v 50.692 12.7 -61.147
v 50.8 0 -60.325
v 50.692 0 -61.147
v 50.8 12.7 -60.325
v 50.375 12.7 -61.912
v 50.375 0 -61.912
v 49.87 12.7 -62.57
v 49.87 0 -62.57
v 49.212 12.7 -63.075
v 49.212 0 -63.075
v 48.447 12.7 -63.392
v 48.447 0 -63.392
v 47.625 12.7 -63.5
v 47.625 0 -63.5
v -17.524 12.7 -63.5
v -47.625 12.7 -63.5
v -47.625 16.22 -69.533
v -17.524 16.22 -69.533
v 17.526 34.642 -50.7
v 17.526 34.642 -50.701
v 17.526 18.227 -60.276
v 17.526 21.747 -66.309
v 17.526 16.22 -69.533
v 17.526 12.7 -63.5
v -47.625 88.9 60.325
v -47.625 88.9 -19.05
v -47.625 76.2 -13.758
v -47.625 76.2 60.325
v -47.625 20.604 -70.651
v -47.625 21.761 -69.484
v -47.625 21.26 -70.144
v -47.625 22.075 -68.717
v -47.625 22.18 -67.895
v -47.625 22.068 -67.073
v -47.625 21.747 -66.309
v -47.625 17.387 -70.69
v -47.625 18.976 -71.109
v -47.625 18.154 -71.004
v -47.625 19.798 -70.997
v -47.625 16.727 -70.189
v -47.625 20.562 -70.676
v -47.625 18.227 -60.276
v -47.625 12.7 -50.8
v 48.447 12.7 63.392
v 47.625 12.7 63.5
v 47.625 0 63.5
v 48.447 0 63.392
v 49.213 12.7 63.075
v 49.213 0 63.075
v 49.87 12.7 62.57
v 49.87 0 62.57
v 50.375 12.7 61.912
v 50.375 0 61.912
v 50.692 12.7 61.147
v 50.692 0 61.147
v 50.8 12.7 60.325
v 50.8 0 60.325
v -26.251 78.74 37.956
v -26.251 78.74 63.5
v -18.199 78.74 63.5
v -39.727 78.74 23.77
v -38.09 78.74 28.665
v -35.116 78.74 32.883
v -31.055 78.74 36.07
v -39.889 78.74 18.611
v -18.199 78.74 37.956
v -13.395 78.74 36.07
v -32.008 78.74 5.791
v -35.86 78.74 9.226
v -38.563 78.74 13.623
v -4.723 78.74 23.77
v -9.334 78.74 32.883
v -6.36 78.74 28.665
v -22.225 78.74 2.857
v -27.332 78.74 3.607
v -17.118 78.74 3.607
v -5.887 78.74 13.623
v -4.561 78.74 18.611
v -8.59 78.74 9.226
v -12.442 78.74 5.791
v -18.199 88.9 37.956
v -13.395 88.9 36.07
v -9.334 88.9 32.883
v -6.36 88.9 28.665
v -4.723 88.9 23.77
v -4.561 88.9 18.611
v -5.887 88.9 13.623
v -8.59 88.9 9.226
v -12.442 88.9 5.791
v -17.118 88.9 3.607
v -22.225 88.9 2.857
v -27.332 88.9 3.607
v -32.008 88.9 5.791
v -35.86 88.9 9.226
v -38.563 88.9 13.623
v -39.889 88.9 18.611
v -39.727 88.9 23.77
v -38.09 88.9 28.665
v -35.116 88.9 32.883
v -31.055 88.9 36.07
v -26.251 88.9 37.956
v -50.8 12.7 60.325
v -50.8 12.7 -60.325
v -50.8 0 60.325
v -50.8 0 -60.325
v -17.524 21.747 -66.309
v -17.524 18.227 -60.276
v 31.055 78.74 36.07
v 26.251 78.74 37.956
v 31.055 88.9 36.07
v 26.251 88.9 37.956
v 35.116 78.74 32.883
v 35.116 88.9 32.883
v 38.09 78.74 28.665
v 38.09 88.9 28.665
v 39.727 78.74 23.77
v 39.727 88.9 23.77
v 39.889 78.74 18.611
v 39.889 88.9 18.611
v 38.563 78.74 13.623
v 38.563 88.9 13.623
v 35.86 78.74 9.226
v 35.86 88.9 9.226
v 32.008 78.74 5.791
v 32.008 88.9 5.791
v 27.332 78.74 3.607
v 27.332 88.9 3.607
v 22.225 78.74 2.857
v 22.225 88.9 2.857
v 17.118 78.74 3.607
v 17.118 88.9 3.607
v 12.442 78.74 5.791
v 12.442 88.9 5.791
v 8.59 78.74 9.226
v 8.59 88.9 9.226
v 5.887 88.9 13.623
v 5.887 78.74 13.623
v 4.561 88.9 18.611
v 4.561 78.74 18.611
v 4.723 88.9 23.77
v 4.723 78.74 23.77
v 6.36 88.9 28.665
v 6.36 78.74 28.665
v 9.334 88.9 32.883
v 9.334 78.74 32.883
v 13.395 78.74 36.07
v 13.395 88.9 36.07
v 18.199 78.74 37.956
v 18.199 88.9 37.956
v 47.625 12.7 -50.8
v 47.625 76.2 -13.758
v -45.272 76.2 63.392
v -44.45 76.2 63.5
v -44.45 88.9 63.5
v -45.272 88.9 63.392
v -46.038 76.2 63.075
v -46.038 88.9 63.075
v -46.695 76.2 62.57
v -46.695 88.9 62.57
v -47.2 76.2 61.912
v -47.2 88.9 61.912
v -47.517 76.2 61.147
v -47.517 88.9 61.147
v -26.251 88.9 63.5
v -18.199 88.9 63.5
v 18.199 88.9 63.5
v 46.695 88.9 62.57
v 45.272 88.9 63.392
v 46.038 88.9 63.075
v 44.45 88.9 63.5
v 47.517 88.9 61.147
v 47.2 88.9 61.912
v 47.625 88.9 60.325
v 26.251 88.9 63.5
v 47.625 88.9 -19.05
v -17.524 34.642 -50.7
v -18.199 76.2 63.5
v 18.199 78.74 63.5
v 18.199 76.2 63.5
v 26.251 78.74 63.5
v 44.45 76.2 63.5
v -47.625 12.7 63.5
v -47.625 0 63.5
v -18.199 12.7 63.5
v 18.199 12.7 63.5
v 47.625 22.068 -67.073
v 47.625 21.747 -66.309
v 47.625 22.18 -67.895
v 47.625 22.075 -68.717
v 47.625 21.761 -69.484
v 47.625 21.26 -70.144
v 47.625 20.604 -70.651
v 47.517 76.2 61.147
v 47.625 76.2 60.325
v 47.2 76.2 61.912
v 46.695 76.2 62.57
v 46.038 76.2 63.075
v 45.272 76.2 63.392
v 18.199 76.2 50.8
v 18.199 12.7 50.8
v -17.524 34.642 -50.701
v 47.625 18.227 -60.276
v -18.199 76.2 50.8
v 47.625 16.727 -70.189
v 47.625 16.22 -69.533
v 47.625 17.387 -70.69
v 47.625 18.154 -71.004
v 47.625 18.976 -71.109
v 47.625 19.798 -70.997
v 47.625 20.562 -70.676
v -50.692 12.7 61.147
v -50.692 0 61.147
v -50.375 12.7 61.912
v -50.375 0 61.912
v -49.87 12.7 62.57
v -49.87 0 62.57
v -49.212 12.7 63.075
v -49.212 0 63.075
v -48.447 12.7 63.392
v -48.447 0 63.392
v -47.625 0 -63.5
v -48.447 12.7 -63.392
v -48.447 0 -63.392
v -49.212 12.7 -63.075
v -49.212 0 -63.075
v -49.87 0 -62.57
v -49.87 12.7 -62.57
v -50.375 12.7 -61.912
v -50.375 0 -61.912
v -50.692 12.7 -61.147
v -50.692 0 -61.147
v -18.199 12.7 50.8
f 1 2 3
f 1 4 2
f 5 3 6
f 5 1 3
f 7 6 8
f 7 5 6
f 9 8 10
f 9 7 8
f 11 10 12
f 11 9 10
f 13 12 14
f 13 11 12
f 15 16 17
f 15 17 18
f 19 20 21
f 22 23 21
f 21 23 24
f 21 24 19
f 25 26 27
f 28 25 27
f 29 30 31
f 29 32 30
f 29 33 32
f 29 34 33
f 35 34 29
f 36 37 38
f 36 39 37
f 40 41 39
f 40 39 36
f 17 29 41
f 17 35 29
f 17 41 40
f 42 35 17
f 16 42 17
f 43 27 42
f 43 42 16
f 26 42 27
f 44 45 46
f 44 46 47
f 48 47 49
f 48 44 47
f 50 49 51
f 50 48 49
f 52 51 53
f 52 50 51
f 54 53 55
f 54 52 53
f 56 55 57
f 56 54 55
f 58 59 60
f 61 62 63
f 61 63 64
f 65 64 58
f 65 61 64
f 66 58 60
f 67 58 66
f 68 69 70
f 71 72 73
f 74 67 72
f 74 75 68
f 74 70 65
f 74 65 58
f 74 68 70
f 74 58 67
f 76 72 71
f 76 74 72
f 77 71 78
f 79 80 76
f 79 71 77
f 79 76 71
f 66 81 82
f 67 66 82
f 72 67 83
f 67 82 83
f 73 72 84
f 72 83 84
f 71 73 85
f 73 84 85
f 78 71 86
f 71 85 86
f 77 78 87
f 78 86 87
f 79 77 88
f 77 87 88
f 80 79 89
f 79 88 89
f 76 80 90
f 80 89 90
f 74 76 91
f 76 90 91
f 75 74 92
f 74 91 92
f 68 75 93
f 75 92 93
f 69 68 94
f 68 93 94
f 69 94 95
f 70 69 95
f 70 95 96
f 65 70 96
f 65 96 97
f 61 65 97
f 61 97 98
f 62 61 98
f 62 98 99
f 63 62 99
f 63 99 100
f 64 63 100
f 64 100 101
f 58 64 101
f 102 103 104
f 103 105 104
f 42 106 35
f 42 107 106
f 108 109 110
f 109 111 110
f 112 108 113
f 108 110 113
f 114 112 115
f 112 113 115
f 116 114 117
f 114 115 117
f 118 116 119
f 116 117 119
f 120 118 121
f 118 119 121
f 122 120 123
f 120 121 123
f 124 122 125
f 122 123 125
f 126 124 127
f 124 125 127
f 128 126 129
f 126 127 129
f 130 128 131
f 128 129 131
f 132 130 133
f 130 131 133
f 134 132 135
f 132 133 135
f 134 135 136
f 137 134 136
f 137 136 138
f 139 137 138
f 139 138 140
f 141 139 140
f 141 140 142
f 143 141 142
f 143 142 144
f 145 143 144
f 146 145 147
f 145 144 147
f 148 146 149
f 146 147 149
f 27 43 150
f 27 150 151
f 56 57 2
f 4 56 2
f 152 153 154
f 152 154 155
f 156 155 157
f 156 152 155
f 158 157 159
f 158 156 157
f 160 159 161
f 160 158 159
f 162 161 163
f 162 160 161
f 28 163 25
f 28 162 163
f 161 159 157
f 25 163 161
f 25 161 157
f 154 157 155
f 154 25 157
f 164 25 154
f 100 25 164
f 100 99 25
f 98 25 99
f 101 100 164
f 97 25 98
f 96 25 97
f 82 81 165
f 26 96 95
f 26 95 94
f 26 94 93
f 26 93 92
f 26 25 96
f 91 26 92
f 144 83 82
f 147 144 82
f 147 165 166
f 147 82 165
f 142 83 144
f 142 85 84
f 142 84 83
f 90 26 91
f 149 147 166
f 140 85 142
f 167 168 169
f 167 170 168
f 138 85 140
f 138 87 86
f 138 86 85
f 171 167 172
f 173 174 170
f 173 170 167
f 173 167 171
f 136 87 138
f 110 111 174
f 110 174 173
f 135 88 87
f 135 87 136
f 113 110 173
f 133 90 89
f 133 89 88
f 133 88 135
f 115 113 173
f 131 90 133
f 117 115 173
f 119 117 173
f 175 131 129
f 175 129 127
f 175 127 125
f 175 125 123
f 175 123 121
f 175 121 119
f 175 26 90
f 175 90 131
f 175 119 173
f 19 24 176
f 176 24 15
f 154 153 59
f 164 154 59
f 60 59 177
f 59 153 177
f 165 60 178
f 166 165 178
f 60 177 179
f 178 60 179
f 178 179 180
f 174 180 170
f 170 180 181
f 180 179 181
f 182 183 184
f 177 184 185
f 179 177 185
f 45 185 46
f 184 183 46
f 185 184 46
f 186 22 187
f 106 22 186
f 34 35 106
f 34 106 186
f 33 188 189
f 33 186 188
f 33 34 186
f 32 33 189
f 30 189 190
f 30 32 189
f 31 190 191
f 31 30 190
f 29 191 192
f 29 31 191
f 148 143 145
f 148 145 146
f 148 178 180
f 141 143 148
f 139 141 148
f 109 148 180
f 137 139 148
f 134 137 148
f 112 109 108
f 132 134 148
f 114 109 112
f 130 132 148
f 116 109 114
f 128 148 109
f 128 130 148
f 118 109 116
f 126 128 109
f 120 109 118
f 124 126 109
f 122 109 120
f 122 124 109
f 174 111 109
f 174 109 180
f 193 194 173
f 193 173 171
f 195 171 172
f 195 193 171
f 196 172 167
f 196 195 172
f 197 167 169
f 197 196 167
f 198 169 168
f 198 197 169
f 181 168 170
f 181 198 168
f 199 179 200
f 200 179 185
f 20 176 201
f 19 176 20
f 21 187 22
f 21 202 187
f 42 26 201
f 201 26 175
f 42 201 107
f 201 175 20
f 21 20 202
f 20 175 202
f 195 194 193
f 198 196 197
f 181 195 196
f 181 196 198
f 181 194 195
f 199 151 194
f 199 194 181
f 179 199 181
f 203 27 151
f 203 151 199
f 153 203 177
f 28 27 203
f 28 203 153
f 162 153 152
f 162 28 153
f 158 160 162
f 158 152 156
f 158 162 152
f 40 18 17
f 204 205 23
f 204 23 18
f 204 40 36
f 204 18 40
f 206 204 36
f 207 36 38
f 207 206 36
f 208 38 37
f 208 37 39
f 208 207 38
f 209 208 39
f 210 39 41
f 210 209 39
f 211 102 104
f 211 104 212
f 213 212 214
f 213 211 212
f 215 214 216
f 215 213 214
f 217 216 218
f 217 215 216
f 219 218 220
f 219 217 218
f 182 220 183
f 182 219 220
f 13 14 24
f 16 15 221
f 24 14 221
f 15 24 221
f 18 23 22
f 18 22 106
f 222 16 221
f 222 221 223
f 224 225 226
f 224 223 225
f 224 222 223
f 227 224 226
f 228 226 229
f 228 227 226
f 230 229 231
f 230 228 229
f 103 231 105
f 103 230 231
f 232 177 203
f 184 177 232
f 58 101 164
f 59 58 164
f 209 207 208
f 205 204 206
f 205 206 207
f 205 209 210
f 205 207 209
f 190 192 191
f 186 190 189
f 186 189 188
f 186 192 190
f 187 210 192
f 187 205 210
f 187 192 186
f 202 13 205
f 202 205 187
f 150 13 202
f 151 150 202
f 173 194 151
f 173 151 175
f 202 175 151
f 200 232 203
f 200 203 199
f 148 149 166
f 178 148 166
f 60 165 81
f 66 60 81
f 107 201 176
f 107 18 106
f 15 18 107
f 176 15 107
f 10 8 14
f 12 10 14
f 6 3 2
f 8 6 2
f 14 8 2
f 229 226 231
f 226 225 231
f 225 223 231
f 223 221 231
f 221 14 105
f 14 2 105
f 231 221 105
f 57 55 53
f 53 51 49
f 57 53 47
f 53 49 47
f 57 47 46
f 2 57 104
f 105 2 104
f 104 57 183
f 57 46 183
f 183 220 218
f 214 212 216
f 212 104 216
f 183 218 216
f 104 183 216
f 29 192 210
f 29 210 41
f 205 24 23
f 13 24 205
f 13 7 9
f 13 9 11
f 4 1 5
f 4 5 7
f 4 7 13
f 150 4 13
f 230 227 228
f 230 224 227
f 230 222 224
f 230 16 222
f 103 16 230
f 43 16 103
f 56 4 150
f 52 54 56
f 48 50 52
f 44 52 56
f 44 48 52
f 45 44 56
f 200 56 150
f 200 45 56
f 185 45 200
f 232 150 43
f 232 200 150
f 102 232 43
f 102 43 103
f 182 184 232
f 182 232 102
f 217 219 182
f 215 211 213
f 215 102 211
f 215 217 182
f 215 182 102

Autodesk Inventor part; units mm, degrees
ref_plane "YZ Plane" through (0, 0, 0) normal (1, 0, 0) x (0, 1, 0)
ref_plane "XZ Plane" through (0, 0, 0) normal (0, 1, 0) x (-1, 0, 0)
ref_plane "XY Plane" through (0, 0, 0) normal (0, 0, 1) x (1, 0, 0)
sketch "Sketch1" plane through (0, 0, 0) normal (0, 1, 0) x (-1, 0, 0)
  line L0 (-50.8, -63.5) -> (50.8, -63.5)
  line L1 (50.8, -63.5) -> (50.8, 63.5)
  line L2 (50.8, 63.5) -> (-50.8, 63.5)
  line L3 (-50.8, 63.5) -> (-50.8, -63.5)
  line L4 (-50.8, -63.5) -> (50.8, 63.5) construction
  line L5 (50.8, -63.5) -> (-50.8, 63.5) construction
  point P0 (0, 0)
  dimension "d0" = 101.6
  dimension "d1" = 127
extrude "Extrusion1" add sketch "Sketch1" along normal blind 12.7
fillet "Fillet1" radius 3.175 4 edges at (-50.8, 6.35, 63.5) (50.8, 6.35, 63.5) (50.8, 6.35, -63.5) (-50.8, 6.35, -63.5)
sketch "Sketch2" plane through (0, 12.7, 0) normal (0, 1, 0) x (1, 0, 0)
  line L0 (47.625, 63.5) -> (-47.625, 63.5) projected
  line L1 (-47.625, 63.5) -> (47.625, 63.5)
  line L2 (47.625, 63.5) -> (47.625, 50.8)
  line L3 (47.625, 50.8) -> (-47.625, 50.8)
  line L4 (-47.625, 50.8) -> (-47.625, 63.5)
  line L5 (-47.625, -39.3448) -> (47.625, -39.3448)
  line L6 (47.625, -39.3448) -> (47.625, -60.325)
  line L7 (47.625, -60.325) -> (-47.625, -60.325)
  line L8 (-47.625, -60.325) -> (-47.625, -39.3448)
  point P0 (0, 0)
  dimension "d5" = 12.7
extrude "Extrusion2" add sketch "Sketch2" along normal blind 76.2 contours L2 L3 L4 L0
sketch "Sketch3" plane through (47.625, 12.7, -50.8) normal (1, 0, 0) x (0, 0, -1)
  point P0 (-50.8, -12.7)
sketch "Sketch4" plane through (-47.625, 12.7, -50.8) normal (0, 0, 1) x (1, 0, 0)
  line L0 (0, 0) -> (0, 76.2) projected
  line L1 (95.25, 0) -> (98.425, 0) projected
  line L2 (0, 76.2) -> (95.25, 76.2)
  line L3 (95.25, 76.2) -> (95.25, 0)
  line L4 (95.25, 0) -> (0, 0)
  line L5 (0, 0) -> (0, 76.2)
  point P0 (47.625, -12.7)
extrude "Extrusion3" add sketch "Sketch4" along normal blind 76.2
sketch "Sketch5" plane through (47.625, 12.7, -63.5) normal (1, 0, 0) x (0, 0, -1)
  line L0 (0, 76.2) -> (-88.9, 76.2) projected
  line L1 (0, 0) -> (0, 76.2) projected
  line L2 (-44.45, 76.2) -> (0, 0)
  line L3 (0, 0) -> (0, 76.2)
  line L4 (0, 76.2) -> (-44.45, 76.2)
  line L5 (0, 0) -> (-88.9, 0) projected
  line L6 (-88.9, 0) -> (-44.45, 76.2)
  line L7 (-88.9, 76.2) -> (-88.9, 0)
  line L8 (-88.9, 76.2) -> (-44.45, 76.2)
  point P0 (-63.5, -12.7)
extrude "Extrusion4" cut sketch "Sketch5" against normal blind 95.25 contours L1 L2 L0
sketch "Sketch6" plane through (47.625, 12.7, 25.4) normal (1, 0, 0) x (0, 0, -1)
  line L0 (44.45, 76.2) -> (0, 76.2) projected
  line L1 (44.45, 76.2) -> (31.75, 76.2)
  line L2 (0, 0) -> (88.9, 0) projected
  line L3 (88.9, 0) -> (76.2, 0)
  line L4 (76.2, 0) -> (31.75, 76.2)
  line L5 (44.45, 76.2) -> (88.9, 0) projected
  line L6 (44.45, 76.2) -> (88.9, 0)
  line L7 (88.9, 0) -> (76.2, 0)
  line L8 (0, 76.2) -> (0, 0) projected
  line L9 (0, 76.2) -> (0, 0)
  line L10 (0, 0) -> (76.2, 0)
  line L11 (31.75, 76.2) -> (0, 76.2)
  point P0 (25.4, -12.7)
  dimension "d12" = 12.7
  dimension "d13" = 12.7
extrude "Extrusion5" cut sketch "Sketch6" against normal blind 95.25 contours L4 L2 L8 L0
sketch "Sketch7" plane through (-47.625, 12.7, -63.5) normal (-1, 0, 0) x (0, 0, 1)
  line L0 (44.45, 76.2) -> (57.15, 76.2) projected
  line L1 (127, -12.7) -> (127, 0) projected
  line L2 (57.15, 76.2) -> (127, 0)
  line L3 (57.15, 76.2) -> (127, 76.2)
  line L4 (127, 76.2) -> (127, 0)
  line L5 (57.15, 76.2) -> (12.7, 0) projected
  line L6 (49.7417, 63.5) -> (127, 63.5)
  point P0 (63.5, -12.7)
  dimension "d16" = 12.7
extrude "Extrusion6" add sketch "Sketch7" against normal blind 95.25 contours L3 L4 L6 L2 | L2 L6 L5
fillet "Fillet2" radius 3.175 2 edges at (47.625, 82.55, 63.5) (-47.625, 82.55, 63.5)
sketch "Sketch8" plane through (47.625, 12.7, -63.5) normal (0, 0.5039, -0.8638) x (-1, 0, 0)
  line L0 (0, 79.9133) -> (0, 6.3992) projected
  line L1 (95.25, 0) -> (0, 0) projected
  line L2 (0, 6.3992) -> (95.25, 6.3992)
  line L3 (95.25, 6.3992) -> (95.25, 0)
  line L4 (95.25, 0) -> (0, 0)
  line L5 (0, 0) -> (0, 6.3992)
  point P0 (47.625, 21.0258)
extrude "Extrusion7" add sketch "Sketch8" along normal blind 10.16
fillet "Fillet3" radius 3.175 2 edges at (0, 23.3468, -69.0516) (0, 17.8193, -72.276)
sketch "Sketch9" plane through (0, 88.9, 0) normal (0, 1, 0) x (1, 0, 0)
  line L0 (-44.45, -63.5) -> (44.45, -63.5) projected
  line L1 (0, -63.5) -> (0, 19.05)
  line L2 (47.625, 19.05) -> (-47.625, 19.05) projected
  arc A0 (-47.625, -60.325) -> (-44.45, -63.5) centre (-44.45, -60.325) ccw projected
  circle A1 centre (-22.225, -20.6375) radius 17.78
  circle A2 centre (22.225, -20.6375) radius 17.78
  line L3 (-18.1992, -63.5) -> (-18.1992, -37.9557)
  line L4 (-26.2508, -37.9557) -> (-26.2508, -63.5)
  line L5 (18.1992, -37.9557) -> (18.1992, -63.5)
  line L6 (26.2508, -37.9557) -> (26.2508, -63.5)
  point P0 (0, 0)
  dimension "d23" = 35.56
  dimension "d24" = 35.56
  dimension "d25" = 8.0516
extrude "Extrusion8" cut sketch "Sketch9" against normal blind 10.16
sketch "Sketch10" plane through (-44.45, 76.2, 63.5) normal (0, 0, 1) x (1, 0, 0)
  line L0 (92.075, 0) -> (-3.175, 0) projected
  line L1 (44.45, 0) -> (44.45, -63.5)
  line L2 (92.075, -63.5) -> (-3.175, -63.5) projected
  line L3 (62.6492, 2.54) -> (62.6492, 12.7) projected
  line L4 (62.6492, 2.54) -> (62.6492, -63.5)
  line L5 (26.2508, 2.54) -> (18.1992, 2.54) projected
  line L6 (26.2508, 2.54) -> (26.2508, -63.5)
  point P0 (44.45, -76.2)
  point P1 (62.6492, 0)
  point P2 (26.2508, 0)
extrude "Extrusion9" add sketch "Sketch10" against normal blind 12.7
sketch "Sketch11" plane through (-47.625, 12.7, -63.5) normal (0, -0.8638, -0.5039) x (1, 0, 0)
  line L0 (95.25, -6.985) -> (0, -6.985) projected
  line L1 (47.625, -6.985) -> (47.625, 0)
  line L2 (95.25, 0) -> (0, 0) projected
  line L3 (47.625, -6.985) -> (30.101, -6.985)
  line L4 (30.101, -6.985) -> (30.101, 0)
  line L5 (47.625, -6.985) -> (65.151, -6.985)
  line L6 (65.151, -6.985) -> (65.151, 0)
  line L7 (47.625, 0) -> (30.101, 0)
  point P0 (47.625, 61.2491)
  dimension "d30" = 17.526
extrude "Extrusion10" cut sketch "Sketch11" against normal blind 25.4
properties part number "PhoneStand"
